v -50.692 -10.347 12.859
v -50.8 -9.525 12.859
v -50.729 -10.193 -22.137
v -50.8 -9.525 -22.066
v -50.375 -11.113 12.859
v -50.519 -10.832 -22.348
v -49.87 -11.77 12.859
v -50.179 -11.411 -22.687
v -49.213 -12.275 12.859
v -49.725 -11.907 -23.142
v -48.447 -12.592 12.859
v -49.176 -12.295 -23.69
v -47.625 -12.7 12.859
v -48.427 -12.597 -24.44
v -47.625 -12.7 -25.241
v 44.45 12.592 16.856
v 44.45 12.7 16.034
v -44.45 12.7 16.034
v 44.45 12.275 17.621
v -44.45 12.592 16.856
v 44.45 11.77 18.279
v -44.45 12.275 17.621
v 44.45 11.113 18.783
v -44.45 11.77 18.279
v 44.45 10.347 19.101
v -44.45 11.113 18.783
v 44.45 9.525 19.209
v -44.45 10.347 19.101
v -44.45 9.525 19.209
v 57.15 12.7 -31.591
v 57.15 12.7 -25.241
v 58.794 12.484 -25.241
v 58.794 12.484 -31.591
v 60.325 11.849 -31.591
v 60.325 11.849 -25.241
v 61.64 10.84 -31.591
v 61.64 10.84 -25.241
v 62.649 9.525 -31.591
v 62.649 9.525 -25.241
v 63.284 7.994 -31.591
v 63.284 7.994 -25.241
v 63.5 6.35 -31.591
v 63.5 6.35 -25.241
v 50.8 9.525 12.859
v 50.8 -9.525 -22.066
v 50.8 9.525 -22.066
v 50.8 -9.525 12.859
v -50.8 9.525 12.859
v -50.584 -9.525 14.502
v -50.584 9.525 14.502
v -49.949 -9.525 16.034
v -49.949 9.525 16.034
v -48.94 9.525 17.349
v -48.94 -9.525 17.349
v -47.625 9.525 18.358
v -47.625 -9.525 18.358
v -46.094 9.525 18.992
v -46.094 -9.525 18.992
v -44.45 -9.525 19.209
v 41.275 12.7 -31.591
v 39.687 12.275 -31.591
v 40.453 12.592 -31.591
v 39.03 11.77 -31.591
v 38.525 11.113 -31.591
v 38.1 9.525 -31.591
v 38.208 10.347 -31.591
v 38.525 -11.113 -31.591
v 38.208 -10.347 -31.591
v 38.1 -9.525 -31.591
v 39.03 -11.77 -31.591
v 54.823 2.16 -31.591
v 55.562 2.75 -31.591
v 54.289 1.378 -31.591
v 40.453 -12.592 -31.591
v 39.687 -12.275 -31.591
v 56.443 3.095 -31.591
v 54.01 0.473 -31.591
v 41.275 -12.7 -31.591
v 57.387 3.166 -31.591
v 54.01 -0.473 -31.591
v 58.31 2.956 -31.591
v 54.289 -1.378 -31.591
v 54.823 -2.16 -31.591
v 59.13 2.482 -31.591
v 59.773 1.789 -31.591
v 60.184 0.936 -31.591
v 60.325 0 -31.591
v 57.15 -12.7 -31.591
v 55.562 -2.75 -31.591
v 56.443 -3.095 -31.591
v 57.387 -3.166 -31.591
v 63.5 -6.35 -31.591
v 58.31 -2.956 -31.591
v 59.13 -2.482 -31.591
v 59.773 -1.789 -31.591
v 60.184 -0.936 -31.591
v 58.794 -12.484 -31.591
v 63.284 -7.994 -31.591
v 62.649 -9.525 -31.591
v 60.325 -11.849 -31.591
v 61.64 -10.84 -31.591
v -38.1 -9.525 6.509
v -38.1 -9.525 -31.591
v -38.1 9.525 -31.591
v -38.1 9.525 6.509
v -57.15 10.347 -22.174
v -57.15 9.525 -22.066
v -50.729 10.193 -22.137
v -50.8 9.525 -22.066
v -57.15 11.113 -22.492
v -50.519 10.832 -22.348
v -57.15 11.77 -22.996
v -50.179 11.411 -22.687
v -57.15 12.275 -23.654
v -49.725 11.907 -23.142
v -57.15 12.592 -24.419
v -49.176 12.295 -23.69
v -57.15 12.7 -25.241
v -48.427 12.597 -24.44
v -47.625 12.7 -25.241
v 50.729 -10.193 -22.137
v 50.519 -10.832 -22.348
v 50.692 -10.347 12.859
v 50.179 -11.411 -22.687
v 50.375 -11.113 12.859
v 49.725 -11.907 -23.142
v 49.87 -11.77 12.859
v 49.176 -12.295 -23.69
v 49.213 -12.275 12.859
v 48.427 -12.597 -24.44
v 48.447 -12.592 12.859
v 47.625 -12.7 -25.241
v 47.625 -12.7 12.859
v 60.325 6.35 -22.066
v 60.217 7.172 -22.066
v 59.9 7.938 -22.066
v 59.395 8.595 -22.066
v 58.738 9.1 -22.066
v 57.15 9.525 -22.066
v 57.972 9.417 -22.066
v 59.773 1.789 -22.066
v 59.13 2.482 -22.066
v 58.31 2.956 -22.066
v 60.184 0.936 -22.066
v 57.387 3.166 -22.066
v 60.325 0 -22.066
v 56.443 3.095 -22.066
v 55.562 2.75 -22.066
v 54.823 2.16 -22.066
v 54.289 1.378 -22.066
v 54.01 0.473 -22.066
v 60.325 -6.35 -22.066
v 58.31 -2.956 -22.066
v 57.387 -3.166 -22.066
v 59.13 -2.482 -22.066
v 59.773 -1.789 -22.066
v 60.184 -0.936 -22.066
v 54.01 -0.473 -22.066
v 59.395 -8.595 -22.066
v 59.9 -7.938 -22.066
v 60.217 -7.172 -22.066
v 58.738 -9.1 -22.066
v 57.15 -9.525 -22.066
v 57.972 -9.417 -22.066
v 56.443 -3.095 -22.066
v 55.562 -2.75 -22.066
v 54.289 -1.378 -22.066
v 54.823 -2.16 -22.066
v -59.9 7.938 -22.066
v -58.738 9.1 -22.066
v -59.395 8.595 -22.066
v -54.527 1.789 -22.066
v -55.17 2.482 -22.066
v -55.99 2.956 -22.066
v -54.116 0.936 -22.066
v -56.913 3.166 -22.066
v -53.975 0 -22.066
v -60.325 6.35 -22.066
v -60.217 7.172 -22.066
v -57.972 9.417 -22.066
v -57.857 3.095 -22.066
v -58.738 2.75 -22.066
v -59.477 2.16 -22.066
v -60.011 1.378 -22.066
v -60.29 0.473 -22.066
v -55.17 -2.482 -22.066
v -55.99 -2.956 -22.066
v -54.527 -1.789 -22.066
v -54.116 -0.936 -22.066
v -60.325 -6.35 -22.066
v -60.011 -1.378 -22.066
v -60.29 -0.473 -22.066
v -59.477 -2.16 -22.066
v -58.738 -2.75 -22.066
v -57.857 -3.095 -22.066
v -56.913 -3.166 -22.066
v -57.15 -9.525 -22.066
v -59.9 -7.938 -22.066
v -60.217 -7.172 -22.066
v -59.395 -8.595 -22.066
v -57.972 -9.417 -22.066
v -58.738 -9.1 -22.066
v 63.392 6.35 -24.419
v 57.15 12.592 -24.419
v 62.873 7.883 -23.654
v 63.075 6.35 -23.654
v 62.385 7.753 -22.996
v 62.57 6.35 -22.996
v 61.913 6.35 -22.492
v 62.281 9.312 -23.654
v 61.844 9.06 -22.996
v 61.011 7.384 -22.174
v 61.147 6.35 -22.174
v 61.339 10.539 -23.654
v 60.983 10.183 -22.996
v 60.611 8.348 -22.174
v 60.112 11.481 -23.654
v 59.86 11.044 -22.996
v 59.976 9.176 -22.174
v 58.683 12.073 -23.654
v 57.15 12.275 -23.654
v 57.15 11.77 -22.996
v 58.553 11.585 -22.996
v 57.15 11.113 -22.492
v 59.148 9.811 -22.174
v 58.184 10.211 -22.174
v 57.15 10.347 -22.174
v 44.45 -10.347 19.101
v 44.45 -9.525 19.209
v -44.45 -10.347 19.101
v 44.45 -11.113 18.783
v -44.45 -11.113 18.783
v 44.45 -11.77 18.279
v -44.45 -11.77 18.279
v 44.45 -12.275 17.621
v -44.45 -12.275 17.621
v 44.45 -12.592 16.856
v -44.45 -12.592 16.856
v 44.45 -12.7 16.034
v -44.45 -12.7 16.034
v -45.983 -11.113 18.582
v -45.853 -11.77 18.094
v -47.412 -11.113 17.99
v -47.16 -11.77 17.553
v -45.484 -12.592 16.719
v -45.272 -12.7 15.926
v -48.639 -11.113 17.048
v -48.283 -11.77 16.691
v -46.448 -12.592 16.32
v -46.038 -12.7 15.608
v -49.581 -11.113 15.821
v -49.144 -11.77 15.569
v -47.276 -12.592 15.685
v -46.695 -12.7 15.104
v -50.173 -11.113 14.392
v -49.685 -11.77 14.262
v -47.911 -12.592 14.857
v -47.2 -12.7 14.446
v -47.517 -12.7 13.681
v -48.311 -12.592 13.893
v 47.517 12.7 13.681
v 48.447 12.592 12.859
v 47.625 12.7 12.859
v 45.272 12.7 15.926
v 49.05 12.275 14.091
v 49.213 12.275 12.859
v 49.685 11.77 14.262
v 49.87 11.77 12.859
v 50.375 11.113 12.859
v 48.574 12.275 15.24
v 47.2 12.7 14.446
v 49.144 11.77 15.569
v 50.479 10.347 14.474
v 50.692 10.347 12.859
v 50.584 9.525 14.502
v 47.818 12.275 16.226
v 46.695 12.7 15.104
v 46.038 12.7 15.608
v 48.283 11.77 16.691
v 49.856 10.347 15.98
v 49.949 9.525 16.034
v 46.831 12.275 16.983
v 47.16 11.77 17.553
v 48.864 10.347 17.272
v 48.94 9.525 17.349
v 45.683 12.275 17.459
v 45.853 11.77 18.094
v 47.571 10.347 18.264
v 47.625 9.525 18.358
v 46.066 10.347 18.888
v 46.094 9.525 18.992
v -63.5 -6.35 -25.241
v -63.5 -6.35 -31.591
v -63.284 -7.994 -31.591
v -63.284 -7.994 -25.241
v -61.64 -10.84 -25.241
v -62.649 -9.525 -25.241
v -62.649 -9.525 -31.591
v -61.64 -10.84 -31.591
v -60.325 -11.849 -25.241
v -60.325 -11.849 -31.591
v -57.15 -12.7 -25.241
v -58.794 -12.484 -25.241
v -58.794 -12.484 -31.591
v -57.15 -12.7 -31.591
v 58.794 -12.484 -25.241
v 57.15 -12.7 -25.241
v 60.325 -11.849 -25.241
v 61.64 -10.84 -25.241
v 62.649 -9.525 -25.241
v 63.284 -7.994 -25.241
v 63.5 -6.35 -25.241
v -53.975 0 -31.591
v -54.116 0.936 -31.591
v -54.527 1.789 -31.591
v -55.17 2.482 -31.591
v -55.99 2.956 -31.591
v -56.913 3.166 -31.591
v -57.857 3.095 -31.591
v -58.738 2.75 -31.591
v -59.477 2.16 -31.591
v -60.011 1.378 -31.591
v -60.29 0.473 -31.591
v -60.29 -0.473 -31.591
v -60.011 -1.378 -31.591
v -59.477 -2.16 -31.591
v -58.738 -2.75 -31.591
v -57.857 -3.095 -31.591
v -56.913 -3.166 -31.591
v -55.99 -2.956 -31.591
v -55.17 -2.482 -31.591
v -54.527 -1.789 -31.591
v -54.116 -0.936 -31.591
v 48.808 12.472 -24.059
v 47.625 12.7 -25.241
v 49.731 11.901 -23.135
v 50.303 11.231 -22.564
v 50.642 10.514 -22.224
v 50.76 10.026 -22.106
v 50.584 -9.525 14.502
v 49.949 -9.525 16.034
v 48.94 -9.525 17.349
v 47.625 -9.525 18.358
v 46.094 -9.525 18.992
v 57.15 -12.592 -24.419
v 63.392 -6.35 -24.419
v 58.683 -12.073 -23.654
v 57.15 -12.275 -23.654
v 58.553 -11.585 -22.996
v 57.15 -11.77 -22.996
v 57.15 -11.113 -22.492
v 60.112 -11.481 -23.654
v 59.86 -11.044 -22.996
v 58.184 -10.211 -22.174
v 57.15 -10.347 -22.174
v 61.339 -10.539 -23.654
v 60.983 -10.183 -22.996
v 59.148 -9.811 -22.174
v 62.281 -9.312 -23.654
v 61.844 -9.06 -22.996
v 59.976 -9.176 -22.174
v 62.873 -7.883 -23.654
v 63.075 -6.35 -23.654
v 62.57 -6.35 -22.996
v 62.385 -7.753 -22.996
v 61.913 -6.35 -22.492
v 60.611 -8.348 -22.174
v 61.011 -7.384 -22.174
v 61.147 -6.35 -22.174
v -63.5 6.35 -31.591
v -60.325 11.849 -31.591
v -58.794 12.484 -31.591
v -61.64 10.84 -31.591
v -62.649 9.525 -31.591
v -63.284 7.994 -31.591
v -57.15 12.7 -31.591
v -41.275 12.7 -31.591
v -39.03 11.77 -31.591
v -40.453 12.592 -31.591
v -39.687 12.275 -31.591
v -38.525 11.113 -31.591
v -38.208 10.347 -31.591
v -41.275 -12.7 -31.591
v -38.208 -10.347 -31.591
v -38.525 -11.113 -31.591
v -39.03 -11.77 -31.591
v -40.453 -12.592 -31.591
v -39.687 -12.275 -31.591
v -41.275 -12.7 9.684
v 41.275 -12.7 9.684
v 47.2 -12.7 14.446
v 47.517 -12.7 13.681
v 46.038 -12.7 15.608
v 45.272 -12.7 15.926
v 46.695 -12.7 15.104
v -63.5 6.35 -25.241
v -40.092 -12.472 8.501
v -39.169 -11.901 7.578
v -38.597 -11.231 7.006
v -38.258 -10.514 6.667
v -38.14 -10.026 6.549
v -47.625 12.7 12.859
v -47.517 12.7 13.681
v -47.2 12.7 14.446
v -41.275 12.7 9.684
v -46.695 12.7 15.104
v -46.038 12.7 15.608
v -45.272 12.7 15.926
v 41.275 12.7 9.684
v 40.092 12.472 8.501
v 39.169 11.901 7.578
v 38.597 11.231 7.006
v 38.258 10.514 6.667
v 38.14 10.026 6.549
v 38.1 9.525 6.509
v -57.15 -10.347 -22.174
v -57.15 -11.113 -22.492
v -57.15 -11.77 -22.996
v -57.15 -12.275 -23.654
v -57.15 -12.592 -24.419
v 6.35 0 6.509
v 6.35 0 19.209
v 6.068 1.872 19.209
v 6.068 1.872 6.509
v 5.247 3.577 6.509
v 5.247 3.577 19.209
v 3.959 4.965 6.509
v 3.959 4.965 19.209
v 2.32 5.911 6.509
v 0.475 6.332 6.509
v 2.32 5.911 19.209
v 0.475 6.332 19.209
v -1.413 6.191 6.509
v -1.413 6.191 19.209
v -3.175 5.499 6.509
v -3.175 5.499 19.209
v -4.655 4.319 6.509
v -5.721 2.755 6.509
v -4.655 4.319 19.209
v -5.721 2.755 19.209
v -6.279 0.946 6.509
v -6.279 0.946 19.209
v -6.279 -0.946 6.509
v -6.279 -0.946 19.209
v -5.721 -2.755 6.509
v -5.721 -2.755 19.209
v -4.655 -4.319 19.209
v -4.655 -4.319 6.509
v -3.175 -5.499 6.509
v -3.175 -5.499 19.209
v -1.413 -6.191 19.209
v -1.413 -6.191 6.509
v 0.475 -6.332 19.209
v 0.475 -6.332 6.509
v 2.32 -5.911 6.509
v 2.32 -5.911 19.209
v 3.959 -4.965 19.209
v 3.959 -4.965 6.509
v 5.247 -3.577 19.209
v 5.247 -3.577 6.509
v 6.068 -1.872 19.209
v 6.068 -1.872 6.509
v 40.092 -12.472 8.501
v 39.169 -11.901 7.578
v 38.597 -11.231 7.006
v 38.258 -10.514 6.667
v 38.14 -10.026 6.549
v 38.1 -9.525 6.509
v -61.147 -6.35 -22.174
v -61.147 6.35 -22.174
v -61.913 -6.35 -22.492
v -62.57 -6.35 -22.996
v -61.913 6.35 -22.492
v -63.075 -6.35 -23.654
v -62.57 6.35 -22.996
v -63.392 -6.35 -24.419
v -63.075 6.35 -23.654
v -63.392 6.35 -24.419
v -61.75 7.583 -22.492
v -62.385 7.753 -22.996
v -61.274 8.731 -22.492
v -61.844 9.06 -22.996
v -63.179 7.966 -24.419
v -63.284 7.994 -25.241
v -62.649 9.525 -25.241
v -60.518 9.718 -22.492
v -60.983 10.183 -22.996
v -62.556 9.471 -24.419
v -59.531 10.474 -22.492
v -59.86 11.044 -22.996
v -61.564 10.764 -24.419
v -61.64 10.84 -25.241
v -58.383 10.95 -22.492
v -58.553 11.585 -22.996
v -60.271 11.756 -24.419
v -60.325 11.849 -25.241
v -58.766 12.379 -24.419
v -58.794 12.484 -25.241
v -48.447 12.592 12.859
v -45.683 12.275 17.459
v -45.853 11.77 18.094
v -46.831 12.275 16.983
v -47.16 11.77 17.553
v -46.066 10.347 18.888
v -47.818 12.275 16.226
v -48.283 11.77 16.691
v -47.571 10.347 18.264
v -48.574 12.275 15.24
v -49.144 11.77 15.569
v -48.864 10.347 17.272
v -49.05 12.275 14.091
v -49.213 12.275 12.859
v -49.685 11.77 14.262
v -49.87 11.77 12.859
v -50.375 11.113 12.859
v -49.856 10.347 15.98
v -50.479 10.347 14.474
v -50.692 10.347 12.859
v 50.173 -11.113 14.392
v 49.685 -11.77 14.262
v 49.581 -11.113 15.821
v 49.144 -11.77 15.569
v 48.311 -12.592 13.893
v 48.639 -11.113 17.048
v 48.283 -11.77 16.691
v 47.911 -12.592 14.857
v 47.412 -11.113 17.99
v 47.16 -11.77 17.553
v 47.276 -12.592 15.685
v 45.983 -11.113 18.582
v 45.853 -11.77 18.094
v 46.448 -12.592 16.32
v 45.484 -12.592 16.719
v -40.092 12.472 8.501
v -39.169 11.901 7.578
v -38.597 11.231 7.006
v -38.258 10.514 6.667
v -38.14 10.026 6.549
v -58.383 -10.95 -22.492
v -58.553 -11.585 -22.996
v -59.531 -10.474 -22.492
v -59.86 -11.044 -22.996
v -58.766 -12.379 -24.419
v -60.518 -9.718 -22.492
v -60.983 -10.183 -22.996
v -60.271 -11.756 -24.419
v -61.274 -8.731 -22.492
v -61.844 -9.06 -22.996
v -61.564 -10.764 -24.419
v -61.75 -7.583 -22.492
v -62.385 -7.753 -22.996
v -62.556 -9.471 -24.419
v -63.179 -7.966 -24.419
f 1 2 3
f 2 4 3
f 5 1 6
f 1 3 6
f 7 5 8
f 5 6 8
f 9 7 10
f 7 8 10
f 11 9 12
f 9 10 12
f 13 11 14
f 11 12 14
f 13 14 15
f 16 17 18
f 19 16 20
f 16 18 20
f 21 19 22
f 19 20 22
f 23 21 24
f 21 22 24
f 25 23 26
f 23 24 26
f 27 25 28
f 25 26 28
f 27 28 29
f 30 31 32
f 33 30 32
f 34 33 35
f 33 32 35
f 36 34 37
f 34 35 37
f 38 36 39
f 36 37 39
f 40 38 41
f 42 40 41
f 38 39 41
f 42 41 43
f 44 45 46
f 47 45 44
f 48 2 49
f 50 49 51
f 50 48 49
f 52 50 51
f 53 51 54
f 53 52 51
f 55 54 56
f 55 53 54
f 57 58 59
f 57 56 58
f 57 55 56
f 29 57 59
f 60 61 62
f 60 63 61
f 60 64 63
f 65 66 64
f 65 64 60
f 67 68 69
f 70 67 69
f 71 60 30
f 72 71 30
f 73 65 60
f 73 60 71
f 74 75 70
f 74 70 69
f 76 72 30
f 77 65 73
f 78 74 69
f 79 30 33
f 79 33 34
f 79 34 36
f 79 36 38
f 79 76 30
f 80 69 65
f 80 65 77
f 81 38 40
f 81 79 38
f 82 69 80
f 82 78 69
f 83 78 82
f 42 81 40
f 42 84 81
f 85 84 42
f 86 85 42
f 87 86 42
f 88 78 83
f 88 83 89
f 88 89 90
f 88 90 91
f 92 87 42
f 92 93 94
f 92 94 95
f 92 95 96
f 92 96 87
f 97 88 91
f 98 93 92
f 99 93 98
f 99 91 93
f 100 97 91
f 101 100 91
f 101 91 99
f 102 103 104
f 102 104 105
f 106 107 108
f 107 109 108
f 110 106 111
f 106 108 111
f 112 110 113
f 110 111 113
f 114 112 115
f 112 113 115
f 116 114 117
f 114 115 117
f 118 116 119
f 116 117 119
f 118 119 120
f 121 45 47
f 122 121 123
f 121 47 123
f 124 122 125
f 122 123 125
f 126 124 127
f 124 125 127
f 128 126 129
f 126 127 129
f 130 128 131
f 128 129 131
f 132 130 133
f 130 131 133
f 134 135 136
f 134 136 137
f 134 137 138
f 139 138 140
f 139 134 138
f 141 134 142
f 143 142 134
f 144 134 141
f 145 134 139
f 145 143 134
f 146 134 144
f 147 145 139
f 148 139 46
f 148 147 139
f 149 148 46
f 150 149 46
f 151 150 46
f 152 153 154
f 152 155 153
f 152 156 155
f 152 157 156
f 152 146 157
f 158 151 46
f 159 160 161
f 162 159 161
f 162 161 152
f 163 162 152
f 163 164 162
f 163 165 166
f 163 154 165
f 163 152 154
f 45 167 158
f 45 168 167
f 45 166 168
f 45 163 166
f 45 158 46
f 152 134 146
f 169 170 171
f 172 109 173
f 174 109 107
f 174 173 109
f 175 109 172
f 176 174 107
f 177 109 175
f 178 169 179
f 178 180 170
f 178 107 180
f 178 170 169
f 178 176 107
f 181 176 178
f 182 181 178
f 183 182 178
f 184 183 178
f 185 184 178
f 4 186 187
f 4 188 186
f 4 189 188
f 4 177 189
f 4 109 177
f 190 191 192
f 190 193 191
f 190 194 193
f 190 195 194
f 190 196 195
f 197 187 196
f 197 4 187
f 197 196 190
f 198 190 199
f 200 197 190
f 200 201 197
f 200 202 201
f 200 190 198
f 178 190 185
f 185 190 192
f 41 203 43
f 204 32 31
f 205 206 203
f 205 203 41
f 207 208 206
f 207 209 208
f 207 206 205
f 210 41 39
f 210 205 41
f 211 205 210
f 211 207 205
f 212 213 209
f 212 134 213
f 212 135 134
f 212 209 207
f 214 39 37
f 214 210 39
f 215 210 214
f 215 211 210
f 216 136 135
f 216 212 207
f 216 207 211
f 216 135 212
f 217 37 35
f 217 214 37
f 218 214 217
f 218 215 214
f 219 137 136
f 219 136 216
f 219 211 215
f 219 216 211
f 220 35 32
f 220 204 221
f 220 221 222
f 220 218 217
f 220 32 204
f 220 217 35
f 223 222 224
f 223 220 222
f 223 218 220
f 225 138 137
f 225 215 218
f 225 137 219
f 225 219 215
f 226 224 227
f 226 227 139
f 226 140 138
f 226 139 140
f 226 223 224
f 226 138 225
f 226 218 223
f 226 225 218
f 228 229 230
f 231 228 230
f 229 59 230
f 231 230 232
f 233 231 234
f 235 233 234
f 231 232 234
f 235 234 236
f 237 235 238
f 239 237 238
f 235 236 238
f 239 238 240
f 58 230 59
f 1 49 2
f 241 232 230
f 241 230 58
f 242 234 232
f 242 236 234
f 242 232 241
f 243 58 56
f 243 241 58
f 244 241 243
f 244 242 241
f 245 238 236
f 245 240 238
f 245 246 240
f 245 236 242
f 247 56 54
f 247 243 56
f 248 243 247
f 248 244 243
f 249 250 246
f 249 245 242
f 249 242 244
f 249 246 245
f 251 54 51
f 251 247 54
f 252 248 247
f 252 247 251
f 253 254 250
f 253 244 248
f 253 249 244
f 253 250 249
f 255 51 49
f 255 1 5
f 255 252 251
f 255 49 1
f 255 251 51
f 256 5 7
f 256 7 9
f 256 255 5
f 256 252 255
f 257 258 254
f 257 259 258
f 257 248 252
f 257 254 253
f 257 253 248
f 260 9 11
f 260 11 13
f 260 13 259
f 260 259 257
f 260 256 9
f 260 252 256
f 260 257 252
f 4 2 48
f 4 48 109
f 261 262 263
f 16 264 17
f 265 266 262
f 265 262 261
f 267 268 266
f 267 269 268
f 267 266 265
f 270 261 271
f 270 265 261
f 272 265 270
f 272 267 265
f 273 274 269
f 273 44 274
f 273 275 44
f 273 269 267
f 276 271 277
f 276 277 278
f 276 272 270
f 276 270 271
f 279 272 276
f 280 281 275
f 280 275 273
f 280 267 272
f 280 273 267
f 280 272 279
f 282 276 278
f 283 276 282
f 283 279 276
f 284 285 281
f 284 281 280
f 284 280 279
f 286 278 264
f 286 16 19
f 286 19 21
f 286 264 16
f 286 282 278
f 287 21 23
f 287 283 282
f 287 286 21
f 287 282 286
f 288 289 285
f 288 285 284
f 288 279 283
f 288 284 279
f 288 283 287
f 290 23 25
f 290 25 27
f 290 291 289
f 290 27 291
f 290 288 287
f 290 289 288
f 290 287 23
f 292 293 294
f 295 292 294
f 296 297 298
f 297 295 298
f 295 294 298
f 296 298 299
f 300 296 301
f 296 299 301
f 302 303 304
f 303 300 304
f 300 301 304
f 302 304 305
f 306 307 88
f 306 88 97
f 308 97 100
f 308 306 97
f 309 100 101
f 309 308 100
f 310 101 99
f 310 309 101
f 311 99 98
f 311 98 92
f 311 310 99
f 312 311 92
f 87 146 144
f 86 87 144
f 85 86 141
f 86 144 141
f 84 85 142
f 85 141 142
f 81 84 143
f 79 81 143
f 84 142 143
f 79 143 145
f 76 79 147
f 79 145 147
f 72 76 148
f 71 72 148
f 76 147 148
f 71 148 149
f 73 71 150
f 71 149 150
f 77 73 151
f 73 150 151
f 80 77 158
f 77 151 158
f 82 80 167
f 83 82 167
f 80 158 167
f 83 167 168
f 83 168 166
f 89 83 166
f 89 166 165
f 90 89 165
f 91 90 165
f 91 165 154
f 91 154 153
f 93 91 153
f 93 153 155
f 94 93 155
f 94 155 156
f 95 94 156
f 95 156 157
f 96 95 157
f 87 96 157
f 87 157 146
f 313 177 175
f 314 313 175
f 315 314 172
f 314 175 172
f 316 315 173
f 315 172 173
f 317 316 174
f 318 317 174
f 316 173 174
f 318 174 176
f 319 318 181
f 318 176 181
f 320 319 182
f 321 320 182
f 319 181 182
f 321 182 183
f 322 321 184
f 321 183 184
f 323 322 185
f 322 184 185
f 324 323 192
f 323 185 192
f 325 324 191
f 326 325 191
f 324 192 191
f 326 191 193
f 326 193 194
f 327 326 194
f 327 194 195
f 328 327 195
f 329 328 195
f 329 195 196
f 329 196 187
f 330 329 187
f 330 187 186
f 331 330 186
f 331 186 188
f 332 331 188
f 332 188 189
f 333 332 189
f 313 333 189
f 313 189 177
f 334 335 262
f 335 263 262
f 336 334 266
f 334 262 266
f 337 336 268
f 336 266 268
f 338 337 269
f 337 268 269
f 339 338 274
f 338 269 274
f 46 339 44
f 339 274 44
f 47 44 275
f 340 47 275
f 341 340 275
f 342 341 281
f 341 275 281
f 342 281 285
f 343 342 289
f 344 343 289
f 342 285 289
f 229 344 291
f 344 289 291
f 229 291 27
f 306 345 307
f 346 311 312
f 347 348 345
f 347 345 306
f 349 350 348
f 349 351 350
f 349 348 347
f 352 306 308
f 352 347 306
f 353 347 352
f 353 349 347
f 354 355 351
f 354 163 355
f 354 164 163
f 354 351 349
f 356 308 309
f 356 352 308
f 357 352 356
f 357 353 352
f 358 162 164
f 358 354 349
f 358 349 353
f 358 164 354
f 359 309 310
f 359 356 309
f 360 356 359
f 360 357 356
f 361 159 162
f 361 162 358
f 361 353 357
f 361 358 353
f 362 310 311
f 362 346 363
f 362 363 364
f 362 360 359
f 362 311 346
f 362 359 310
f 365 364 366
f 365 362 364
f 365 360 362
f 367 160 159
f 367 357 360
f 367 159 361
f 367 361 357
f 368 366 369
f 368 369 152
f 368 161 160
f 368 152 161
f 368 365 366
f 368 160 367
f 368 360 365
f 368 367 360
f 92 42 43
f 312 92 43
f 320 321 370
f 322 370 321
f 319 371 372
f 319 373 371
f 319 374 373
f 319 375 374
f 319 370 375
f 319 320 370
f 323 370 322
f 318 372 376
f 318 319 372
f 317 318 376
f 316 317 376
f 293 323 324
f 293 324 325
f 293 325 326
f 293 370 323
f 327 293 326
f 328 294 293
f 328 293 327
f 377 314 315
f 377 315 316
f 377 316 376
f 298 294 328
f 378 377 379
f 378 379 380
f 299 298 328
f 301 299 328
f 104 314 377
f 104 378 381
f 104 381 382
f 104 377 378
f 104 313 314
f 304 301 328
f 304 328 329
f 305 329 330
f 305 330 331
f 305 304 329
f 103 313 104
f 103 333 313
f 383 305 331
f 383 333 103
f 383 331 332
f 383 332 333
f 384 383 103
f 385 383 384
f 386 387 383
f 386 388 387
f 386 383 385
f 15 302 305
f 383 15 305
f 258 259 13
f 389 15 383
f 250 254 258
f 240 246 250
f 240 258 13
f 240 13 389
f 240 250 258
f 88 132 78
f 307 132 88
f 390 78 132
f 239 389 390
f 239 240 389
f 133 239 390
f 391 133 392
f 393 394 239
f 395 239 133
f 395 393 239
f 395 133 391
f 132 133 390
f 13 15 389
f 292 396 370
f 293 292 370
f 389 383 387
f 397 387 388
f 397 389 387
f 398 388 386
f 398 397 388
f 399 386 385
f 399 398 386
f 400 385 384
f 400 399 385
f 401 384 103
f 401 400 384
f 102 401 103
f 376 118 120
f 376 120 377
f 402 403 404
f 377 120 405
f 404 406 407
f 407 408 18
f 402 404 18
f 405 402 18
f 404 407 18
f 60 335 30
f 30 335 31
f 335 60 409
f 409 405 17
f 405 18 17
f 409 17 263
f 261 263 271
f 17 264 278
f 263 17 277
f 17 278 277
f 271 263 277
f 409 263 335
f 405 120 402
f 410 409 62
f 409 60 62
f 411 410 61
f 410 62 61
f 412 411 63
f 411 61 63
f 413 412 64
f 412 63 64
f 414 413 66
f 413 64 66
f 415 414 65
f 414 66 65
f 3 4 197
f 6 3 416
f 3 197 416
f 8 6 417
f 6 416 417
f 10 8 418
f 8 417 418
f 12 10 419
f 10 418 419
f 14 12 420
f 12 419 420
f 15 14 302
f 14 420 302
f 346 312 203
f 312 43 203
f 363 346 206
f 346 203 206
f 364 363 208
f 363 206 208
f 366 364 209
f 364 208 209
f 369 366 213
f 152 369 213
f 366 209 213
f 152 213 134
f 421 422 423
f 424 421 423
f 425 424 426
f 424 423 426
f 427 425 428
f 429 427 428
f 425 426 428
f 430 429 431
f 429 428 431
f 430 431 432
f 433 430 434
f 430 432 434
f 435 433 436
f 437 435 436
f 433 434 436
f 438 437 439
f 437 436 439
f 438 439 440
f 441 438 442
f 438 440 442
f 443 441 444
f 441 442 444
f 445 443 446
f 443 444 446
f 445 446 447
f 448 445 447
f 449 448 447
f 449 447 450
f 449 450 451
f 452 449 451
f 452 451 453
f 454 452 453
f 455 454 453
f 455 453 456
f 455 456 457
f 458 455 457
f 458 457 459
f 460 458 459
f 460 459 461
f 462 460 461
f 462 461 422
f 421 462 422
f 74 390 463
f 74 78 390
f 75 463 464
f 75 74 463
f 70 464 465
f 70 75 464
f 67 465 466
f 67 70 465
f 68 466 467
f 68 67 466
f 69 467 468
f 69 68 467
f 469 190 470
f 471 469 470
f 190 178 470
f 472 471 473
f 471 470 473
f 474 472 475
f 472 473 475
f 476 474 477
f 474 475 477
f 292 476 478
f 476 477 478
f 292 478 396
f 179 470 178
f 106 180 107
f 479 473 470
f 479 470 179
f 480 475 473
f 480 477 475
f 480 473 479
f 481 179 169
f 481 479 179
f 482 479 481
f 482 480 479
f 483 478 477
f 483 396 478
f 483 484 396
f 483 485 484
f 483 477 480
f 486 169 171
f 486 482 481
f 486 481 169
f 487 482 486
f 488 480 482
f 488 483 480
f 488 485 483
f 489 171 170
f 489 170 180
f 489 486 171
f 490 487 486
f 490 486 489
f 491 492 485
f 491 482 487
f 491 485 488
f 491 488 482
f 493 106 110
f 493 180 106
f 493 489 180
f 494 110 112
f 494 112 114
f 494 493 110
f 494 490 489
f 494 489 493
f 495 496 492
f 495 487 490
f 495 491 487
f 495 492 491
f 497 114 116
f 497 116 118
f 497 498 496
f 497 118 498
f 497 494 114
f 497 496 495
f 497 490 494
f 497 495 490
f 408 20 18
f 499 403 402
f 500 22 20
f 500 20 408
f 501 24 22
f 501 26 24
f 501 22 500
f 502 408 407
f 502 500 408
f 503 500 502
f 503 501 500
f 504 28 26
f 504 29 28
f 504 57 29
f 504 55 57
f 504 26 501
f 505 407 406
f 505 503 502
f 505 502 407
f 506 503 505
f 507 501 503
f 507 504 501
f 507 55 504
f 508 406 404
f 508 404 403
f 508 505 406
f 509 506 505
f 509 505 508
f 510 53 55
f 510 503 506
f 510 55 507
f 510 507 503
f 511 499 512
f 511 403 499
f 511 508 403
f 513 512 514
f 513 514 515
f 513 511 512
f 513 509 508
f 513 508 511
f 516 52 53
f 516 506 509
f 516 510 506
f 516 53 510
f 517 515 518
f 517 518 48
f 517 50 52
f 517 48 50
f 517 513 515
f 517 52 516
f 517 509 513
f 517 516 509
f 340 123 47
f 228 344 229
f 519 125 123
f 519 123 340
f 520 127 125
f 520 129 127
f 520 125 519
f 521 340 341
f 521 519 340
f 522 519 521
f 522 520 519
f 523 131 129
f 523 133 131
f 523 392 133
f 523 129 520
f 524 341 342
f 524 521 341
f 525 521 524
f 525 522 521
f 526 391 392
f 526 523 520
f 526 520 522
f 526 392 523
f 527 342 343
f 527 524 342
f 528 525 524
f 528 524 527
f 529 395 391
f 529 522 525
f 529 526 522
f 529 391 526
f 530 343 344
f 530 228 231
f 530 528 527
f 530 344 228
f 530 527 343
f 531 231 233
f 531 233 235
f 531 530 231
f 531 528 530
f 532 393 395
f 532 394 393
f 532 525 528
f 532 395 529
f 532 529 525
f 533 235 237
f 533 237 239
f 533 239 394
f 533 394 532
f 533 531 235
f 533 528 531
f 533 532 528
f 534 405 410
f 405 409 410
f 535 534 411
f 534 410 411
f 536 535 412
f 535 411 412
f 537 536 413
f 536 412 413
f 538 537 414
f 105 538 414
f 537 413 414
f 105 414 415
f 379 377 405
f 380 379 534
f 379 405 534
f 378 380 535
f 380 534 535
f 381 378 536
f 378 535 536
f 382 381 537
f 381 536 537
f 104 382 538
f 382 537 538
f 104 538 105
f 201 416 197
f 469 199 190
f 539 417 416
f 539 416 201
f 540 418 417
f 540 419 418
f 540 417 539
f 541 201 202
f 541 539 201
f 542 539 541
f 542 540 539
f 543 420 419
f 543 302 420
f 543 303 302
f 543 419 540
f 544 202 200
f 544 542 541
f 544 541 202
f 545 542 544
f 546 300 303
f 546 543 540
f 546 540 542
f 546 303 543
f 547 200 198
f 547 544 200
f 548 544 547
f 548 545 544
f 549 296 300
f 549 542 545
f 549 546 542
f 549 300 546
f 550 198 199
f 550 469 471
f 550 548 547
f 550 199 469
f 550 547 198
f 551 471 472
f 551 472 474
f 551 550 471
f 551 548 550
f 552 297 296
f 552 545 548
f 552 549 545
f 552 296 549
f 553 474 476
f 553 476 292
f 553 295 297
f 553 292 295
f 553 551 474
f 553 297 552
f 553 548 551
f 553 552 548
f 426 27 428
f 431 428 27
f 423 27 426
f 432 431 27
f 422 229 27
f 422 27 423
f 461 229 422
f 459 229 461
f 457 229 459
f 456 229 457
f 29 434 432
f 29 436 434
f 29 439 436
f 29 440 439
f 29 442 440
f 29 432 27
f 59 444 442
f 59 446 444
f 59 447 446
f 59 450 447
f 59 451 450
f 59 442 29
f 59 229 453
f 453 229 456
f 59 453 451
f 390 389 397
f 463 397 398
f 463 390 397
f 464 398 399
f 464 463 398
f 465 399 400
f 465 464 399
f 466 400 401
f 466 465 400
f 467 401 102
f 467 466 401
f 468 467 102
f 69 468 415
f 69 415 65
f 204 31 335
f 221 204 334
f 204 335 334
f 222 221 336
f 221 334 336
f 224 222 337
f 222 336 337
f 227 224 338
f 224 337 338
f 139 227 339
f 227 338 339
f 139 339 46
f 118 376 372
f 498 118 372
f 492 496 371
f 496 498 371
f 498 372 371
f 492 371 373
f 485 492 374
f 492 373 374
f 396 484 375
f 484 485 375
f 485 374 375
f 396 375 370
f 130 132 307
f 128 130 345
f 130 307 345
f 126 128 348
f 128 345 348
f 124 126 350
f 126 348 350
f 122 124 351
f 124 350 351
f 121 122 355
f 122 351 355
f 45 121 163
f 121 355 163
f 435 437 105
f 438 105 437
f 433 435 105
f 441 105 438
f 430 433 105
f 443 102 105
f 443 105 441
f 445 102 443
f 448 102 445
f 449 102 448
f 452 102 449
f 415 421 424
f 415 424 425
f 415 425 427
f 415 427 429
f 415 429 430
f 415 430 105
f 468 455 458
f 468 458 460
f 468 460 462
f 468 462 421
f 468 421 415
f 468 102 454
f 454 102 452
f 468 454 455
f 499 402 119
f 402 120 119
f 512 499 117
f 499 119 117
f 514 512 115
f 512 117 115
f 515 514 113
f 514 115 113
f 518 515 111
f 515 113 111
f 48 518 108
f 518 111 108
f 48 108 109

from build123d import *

# Parameters (mm, degrees)
F1_DEPTH = 12.7
F2_R     = 3.175
F3_DEPTH = 9.526
F4_R     = 6.35
F5_DEPTH = 50.801
F6_R     = 6.35
F7_R     = 3.17499


# Not quite as in the source:
# - a fillet or chamfer is up to 0.001 mm smaller than in the source, because OpenCascade refuses the exact size


with BuildPart() as f1:
    # F0 (on Front) → F1 (new body, symmetric)
    with BuildSketch(Plane.XZ):
        Polygon((-50.8, -22.066242151), (-63.5, -22.066242151), (-63.5, -31.591242151), (-38.1, -31.591242151), (-38.1, 6.508757849), (0, 6.508757849), (38.1, 6.508757849), (38.1, -31.591242151), (63.5, -31.591242151), (63.5, -22.066242151), (50.8, -22.066242151), (50.8, 19.208757849), (0, 19.208757849), (-50.8, 19.208757849), align=None)
    extrude(amount=F1_DEPTH, both=True)

    # F2 (on face) → F3 (cut, through all)
    with BuildSketch(Plane.XY.offset(-22.066242151)):
        with Locations((-57.15, 0)):
            Circle(F2_R)
        with Locations((57.15, 0)):
            Circle(F2_R)
    extrude(amount=-F3_DEPTH, mode=Mode.SUBTRACT)

    # F4 (on face) → F5 (cut, through all)
    with BuildSketch(Plane.XY.offset(19.208757849)):
        Circle(F4_R)
    extrude(amount=-F5_DEPTH, mode=Mode.SUBTRACT)

    # F6
    f6_edges = [f1.edges().sort_by_distance(p)[0] for p in [
        (-50.8, 0, 19.208758),
        (50.8, 0, 19.208758),
        (-63.5, -12.7, -26.828742),
        (63.5, -12.7, -26.828742),
        (63.5, 12.7, -26.828742),
        (-63.5, 12.7, -26.828742),
    ]]
    fillet(f6_edges, radius=F6_R)

    # F7 (radius 3.175 in the source; OpenCascade refuses exactly that, so slightly less here)
    f7_edges = [f1.edges().sort_by_distance(p)[0] for p in [
        (-50.8, -12.7, -4.603742),
        (-53.975, -12.7, -22.066242),
        (-38.1, -12.7, -12.541242),
        (0, -12.7, 6.508758),
        (38.1, -12.7, -12.541242),
        (50.8, 12.7, -4.603742),
        (53.975, 12.7, -22.066242),
        (38.1, 12.7, -12.541242),
        (0, 12.7, 6.508758),
        (-38.1, 12.7, -12.541242),
    ]]
    fillet(f7_edges, radius=F7_R)


solid = f1.part
